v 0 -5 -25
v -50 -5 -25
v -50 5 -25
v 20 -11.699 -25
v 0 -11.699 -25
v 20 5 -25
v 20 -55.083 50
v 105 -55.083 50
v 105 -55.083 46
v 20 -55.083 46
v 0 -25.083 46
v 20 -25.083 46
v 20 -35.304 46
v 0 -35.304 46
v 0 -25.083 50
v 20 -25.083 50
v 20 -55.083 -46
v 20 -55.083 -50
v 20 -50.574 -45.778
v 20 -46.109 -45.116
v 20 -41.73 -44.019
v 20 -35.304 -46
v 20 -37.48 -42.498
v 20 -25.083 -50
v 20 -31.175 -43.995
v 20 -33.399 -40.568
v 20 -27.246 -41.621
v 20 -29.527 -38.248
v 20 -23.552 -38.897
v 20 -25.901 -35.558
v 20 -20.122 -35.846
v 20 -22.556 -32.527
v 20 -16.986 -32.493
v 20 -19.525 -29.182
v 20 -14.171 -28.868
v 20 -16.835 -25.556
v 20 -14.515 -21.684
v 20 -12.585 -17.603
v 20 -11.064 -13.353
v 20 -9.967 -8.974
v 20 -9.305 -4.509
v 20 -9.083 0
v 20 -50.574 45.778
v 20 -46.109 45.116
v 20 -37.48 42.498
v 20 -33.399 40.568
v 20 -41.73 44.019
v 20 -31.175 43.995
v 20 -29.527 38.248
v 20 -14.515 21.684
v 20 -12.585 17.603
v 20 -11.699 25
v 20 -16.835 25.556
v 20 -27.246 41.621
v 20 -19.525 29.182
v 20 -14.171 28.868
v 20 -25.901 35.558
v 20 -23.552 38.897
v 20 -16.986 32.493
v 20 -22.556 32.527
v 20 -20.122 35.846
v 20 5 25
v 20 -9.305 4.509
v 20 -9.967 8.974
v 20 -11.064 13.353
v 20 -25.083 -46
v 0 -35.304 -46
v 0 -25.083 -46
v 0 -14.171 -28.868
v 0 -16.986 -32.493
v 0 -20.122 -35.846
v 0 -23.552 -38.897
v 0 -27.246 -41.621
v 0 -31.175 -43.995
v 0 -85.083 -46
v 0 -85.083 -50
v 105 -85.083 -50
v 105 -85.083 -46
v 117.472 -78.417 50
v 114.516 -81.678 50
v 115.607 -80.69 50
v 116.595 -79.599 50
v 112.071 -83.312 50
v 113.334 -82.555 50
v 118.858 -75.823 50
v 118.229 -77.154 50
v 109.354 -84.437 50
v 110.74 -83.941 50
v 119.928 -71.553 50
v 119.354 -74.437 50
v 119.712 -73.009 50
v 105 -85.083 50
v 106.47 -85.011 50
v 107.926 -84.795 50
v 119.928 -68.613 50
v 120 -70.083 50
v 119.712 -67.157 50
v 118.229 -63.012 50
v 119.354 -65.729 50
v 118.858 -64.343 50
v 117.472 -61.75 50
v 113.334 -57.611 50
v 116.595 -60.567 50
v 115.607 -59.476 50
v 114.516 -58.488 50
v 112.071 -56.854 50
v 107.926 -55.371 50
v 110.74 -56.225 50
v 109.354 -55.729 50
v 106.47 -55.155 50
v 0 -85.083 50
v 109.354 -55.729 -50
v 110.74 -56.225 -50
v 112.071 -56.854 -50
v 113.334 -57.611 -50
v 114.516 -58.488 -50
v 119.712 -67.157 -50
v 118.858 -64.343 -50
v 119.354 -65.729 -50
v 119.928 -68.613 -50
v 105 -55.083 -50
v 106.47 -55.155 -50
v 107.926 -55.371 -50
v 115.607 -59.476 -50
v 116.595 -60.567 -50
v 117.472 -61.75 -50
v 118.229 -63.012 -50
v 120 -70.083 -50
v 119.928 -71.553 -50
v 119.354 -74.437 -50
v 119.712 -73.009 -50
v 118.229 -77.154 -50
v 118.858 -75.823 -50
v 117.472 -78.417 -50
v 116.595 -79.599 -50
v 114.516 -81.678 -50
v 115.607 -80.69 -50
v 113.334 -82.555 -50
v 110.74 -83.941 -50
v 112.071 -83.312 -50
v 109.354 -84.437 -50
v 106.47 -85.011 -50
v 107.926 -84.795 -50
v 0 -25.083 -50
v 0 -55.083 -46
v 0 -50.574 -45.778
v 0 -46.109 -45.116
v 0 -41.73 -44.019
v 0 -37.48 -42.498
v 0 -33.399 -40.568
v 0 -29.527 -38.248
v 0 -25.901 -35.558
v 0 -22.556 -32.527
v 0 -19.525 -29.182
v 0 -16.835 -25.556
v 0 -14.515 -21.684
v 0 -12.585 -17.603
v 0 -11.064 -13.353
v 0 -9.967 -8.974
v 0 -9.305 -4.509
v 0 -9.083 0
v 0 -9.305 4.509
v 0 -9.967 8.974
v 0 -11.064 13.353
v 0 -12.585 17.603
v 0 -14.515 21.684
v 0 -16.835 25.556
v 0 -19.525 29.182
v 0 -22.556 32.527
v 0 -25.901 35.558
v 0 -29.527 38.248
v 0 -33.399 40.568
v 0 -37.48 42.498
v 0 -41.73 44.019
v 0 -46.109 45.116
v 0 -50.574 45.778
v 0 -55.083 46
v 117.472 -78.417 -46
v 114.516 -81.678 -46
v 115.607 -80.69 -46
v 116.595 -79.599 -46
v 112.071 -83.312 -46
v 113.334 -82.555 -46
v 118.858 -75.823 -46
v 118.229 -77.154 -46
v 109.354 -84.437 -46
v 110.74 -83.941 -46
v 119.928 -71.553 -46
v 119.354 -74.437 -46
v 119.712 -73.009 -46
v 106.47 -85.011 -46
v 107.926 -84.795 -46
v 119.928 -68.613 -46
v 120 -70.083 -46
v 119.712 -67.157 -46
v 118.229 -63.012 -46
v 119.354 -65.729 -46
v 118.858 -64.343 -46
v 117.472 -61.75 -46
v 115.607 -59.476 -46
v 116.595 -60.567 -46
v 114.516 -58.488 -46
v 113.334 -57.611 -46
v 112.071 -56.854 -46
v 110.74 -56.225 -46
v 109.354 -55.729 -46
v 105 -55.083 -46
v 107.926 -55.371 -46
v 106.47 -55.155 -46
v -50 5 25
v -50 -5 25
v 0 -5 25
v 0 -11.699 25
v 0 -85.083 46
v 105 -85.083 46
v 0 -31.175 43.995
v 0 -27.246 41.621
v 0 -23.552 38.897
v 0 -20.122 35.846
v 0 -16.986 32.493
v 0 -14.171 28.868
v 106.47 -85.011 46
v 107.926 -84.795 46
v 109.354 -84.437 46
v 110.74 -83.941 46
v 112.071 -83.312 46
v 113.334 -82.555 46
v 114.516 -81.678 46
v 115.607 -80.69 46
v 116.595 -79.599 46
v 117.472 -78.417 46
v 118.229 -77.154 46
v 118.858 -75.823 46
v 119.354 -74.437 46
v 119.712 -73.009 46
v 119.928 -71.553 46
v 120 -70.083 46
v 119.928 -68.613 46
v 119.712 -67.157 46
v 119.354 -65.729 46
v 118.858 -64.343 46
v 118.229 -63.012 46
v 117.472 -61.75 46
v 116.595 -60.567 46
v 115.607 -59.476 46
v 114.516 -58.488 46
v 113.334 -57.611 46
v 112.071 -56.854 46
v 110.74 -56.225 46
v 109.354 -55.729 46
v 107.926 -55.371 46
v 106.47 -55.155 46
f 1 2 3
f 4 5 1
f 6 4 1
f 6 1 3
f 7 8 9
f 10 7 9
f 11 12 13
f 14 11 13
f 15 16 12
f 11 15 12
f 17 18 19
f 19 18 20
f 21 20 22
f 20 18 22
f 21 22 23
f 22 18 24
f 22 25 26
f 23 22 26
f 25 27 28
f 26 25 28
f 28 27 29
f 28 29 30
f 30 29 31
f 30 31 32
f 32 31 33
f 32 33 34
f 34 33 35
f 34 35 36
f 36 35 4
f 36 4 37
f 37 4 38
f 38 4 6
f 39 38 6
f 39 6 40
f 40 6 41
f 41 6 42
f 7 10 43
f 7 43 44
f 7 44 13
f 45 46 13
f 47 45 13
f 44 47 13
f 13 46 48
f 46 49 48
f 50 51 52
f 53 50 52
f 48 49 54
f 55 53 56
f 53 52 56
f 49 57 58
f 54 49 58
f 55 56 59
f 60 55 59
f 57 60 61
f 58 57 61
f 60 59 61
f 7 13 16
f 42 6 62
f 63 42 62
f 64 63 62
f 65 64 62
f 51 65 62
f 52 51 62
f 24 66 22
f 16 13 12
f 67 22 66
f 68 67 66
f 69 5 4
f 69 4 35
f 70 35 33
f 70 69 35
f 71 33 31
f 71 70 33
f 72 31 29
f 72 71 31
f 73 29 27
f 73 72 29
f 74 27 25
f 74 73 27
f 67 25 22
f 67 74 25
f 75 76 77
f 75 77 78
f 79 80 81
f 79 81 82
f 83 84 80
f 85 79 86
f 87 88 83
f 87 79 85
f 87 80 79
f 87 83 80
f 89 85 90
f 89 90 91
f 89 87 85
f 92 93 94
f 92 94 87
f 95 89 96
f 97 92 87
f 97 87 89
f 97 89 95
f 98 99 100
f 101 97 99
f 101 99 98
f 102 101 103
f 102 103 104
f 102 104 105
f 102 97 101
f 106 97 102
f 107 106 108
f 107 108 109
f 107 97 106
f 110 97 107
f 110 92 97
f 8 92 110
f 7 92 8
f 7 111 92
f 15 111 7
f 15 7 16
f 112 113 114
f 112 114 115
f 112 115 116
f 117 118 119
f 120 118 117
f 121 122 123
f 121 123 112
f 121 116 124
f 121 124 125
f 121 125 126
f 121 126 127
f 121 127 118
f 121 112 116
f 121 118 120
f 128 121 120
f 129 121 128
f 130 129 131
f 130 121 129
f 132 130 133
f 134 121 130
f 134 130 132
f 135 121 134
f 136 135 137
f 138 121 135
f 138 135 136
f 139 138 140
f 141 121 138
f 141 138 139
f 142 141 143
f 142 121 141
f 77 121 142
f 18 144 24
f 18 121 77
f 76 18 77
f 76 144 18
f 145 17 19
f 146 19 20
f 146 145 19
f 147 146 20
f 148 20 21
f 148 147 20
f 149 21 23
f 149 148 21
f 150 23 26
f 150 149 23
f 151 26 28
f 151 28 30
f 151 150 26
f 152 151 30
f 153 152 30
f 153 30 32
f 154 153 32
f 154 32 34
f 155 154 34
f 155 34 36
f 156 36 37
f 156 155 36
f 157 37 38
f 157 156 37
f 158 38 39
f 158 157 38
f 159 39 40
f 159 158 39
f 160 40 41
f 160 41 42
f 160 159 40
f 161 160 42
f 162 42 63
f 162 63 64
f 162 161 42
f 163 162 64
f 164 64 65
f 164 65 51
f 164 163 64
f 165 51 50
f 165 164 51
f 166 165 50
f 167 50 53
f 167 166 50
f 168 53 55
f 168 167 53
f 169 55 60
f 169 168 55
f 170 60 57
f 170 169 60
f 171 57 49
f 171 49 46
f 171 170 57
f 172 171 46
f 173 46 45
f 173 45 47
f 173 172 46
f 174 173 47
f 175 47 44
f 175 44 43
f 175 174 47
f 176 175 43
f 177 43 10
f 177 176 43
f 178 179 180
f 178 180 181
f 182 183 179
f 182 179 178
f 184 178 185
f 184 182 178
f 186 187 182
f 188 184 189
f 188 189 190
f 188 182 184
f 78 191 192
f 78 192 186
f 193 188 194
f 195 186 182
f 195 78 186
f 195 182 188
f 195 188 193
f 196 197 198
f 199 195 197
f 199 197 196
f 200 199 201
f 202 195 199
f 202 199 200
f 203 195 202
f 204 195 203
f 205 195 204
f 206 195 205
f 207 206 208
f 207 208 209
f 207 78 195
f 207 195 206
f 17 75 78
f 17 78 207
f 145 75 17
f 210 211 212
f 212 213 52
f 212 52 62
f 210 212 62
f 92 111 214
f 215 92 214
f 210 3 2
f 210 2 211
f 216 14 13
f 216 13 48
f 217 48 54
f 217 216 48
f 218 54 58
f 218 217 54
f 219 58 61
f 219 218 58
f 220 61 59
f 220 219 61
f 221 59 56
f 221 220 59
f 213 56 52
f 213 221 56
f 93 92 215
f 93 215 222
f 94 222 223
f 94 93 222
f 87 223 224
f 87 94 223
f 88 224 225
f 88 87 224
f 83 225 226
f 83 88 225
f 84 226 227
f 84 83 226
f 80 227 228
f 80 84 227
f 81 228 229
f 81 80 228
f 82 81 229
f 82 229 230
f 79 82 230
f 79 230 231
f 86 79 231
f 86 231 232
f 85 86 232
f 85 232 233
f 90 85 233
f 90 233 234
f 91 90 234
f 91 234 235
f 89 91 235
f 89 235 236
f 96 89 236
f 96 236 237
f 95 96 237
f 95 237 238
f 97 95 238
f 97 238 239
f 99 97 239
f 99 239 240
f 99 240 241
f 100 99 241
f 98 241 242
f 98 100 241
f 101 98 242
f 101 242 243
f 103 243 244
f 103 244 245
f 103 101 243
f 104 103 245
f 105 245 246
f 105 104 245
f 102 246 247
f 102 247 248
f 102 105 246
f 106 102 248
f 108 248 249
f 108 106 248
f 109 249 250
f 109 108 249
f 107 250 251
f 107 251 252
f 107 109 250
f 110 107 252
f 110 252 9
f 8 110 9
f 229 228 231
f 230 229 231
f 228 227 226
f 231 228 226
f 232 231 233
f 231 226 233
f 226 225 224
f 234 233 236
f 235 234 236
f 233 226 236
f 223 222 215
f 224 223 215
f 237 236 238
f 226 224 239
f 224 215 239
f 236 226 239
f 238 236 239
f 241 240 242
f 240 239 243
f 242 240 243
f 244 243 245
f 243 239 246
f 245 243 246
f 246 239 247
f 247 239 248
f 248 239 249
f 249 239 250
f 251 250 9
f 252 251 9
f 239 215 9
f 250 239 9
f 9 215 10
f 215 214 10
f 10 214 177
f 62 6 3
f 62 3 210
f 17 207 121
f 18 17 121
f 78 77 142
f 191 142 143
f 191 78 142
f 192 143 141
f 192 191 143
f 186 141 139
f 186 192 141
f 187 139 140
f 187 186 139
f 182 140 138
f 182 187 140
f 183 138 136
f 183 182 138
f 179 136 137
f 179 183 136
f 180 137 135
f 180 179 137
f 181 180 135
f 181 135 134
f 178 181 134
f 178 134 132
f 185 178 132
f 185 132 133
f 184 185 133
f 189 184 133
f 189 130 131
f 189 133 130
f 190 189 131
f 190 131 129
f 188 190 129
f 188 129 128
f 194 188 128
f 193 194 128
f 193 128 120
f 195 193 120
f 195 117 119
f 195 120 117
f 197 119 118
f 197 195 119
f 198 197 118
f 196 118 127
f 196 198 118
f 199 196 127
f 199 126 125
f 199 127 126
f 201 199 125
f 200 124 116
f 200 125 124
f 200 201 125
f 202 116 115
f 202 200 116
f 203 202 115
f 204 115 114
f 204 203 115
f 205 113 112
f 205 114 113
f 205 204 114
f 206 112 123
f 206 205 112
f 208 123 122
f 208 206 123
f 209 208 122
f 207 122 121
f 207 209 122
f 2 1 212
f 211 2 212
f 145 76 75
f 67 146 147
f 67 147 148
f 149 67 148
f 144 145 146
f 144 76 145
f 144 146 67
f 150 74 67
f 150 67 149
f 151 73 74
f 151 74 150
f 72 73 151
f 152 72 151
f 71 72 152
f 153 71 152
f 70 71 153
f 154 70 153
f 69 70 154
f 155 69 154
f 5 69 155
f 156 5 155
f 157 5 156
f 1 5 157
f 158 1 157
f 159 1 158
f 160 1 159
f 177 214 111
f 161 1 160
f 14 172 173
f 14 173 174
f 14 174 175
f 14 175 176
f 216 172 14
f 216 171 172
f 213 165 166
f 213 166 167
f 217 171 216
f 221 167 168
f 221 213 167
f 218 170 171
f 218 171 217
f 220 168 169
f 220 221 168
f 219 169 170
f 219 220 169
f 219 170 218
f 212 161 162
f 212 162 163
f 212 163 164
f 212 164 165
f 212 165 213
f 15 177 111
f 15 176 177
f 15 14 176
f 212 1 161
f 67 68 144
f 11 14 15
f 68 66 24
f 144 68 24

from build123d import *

# Parameters (mm, degrees)
EXTRUDE_1_DEPTH     = 20
SKETCH_2_W          = 4
SKETCH_2_H          = 30
EXTRUDE_2_DEPTH     = 100
CUT_EXTRUDE_1_DEPTH = 100
SKETCH_4_W          = 50
SKETCH_4_H          = 10
EXTRUDE_3_DEPTH     = 50


with BuildPart() as part:
    # 草图1 → 凸台-拉伸1 (new body)
    with BuildSketch(Plane(origin=(0, 0, 0), x_dir=(0, 0, -1), z_dir=(1, 0, 0))):
        with BuildLine():
            Line((-25, 5), (25, 5))
            Line((25, 5), (25, -5))
            Line((25, -5), (25, -11.698777218))
            ThreePointArc((25, -11.698777218), (37.410642162, -21.801835726), (46, -35.304382227))
            Line((46, -35.304382227), (46, -25.083062159))
            Line((46, -25.083062159), (50, -25.083062159))
            Line((50, -25.083062159), (50, -85.083062159))
            Line((50, -85.083062159), (46, -85.083062159))
            Line((46, -85.083062159), (46, -55.083062159))
            ThreePointArc((46, -55.083062159), (0, -9.083062159), (-46, -55.083062159))
            Line((-46, -55.083062159), (-46, -85.083062159))
            Line((-46, -85.083062159), (-50, -85.083062159))
            Line((-50, -85.083062159), (-50, -25.083062159))
            Line((-50, -25.083062159), (-46, -25.083062159))
            Line((-46, -25.083062159), (-46, -35.304382227))
            ThreePointArc((-46, -35.304382227), (-37.410642162, -21.801835726), (-25, -11.698777218))
            Line((-25, -11.698777218), (-25, -5))
            Line((-25, -5), (-25, 5))
        make_face()
    extrude(amount=EXTRUDE_1_DEPTH)

    # 草图2 → 凸台-拉伸2 (add)
    with BuildSketch(Plane(origin=(20, 0, 0), x_dir=(0, 0, -1), z_dir=(1, 0, 0))):
        with Locations((-48, -70.083062159)):
            Rectangle(SKETCH_2_W, SKETCH_2_H)
        with Locations((48, -70.083062159)):
            Rectangle(SKETCH_2_W, SKETCH_2_H)
    extrude(amount=EXTRUDE_2_DEPTH)

    # 草图3 → 切除-拉伸1 (cut)
    with BuildSketch(Plane.XY.offset(50)):
        with BuildLine():
            Line((105, -55.083062159), (132.360099234, -55.083062159))
            Line((132.360099234, -55.083062159), (132.360099234, -85.083062159))
            Line((132.360099234, -85.083062159), (105, -85.083062159))
            ThreePointArc((105, -85.083062159), (120, -70.083062159), (105, -55.083062159))
        make_face()
    extrude(amount=-CUT_EXTRUDE_1_DEPTH, mode=Mode.SUBTRACT)

    # 草图4 → 凸台-拉伸3 (add)
    with BuildSketch(Plane.ZY):
        Rectangle(SKETCH_4_W, SKETCH_4_H)
    extrude(amount=EXTRUDE_3_DEPTH)


solid = part.part
